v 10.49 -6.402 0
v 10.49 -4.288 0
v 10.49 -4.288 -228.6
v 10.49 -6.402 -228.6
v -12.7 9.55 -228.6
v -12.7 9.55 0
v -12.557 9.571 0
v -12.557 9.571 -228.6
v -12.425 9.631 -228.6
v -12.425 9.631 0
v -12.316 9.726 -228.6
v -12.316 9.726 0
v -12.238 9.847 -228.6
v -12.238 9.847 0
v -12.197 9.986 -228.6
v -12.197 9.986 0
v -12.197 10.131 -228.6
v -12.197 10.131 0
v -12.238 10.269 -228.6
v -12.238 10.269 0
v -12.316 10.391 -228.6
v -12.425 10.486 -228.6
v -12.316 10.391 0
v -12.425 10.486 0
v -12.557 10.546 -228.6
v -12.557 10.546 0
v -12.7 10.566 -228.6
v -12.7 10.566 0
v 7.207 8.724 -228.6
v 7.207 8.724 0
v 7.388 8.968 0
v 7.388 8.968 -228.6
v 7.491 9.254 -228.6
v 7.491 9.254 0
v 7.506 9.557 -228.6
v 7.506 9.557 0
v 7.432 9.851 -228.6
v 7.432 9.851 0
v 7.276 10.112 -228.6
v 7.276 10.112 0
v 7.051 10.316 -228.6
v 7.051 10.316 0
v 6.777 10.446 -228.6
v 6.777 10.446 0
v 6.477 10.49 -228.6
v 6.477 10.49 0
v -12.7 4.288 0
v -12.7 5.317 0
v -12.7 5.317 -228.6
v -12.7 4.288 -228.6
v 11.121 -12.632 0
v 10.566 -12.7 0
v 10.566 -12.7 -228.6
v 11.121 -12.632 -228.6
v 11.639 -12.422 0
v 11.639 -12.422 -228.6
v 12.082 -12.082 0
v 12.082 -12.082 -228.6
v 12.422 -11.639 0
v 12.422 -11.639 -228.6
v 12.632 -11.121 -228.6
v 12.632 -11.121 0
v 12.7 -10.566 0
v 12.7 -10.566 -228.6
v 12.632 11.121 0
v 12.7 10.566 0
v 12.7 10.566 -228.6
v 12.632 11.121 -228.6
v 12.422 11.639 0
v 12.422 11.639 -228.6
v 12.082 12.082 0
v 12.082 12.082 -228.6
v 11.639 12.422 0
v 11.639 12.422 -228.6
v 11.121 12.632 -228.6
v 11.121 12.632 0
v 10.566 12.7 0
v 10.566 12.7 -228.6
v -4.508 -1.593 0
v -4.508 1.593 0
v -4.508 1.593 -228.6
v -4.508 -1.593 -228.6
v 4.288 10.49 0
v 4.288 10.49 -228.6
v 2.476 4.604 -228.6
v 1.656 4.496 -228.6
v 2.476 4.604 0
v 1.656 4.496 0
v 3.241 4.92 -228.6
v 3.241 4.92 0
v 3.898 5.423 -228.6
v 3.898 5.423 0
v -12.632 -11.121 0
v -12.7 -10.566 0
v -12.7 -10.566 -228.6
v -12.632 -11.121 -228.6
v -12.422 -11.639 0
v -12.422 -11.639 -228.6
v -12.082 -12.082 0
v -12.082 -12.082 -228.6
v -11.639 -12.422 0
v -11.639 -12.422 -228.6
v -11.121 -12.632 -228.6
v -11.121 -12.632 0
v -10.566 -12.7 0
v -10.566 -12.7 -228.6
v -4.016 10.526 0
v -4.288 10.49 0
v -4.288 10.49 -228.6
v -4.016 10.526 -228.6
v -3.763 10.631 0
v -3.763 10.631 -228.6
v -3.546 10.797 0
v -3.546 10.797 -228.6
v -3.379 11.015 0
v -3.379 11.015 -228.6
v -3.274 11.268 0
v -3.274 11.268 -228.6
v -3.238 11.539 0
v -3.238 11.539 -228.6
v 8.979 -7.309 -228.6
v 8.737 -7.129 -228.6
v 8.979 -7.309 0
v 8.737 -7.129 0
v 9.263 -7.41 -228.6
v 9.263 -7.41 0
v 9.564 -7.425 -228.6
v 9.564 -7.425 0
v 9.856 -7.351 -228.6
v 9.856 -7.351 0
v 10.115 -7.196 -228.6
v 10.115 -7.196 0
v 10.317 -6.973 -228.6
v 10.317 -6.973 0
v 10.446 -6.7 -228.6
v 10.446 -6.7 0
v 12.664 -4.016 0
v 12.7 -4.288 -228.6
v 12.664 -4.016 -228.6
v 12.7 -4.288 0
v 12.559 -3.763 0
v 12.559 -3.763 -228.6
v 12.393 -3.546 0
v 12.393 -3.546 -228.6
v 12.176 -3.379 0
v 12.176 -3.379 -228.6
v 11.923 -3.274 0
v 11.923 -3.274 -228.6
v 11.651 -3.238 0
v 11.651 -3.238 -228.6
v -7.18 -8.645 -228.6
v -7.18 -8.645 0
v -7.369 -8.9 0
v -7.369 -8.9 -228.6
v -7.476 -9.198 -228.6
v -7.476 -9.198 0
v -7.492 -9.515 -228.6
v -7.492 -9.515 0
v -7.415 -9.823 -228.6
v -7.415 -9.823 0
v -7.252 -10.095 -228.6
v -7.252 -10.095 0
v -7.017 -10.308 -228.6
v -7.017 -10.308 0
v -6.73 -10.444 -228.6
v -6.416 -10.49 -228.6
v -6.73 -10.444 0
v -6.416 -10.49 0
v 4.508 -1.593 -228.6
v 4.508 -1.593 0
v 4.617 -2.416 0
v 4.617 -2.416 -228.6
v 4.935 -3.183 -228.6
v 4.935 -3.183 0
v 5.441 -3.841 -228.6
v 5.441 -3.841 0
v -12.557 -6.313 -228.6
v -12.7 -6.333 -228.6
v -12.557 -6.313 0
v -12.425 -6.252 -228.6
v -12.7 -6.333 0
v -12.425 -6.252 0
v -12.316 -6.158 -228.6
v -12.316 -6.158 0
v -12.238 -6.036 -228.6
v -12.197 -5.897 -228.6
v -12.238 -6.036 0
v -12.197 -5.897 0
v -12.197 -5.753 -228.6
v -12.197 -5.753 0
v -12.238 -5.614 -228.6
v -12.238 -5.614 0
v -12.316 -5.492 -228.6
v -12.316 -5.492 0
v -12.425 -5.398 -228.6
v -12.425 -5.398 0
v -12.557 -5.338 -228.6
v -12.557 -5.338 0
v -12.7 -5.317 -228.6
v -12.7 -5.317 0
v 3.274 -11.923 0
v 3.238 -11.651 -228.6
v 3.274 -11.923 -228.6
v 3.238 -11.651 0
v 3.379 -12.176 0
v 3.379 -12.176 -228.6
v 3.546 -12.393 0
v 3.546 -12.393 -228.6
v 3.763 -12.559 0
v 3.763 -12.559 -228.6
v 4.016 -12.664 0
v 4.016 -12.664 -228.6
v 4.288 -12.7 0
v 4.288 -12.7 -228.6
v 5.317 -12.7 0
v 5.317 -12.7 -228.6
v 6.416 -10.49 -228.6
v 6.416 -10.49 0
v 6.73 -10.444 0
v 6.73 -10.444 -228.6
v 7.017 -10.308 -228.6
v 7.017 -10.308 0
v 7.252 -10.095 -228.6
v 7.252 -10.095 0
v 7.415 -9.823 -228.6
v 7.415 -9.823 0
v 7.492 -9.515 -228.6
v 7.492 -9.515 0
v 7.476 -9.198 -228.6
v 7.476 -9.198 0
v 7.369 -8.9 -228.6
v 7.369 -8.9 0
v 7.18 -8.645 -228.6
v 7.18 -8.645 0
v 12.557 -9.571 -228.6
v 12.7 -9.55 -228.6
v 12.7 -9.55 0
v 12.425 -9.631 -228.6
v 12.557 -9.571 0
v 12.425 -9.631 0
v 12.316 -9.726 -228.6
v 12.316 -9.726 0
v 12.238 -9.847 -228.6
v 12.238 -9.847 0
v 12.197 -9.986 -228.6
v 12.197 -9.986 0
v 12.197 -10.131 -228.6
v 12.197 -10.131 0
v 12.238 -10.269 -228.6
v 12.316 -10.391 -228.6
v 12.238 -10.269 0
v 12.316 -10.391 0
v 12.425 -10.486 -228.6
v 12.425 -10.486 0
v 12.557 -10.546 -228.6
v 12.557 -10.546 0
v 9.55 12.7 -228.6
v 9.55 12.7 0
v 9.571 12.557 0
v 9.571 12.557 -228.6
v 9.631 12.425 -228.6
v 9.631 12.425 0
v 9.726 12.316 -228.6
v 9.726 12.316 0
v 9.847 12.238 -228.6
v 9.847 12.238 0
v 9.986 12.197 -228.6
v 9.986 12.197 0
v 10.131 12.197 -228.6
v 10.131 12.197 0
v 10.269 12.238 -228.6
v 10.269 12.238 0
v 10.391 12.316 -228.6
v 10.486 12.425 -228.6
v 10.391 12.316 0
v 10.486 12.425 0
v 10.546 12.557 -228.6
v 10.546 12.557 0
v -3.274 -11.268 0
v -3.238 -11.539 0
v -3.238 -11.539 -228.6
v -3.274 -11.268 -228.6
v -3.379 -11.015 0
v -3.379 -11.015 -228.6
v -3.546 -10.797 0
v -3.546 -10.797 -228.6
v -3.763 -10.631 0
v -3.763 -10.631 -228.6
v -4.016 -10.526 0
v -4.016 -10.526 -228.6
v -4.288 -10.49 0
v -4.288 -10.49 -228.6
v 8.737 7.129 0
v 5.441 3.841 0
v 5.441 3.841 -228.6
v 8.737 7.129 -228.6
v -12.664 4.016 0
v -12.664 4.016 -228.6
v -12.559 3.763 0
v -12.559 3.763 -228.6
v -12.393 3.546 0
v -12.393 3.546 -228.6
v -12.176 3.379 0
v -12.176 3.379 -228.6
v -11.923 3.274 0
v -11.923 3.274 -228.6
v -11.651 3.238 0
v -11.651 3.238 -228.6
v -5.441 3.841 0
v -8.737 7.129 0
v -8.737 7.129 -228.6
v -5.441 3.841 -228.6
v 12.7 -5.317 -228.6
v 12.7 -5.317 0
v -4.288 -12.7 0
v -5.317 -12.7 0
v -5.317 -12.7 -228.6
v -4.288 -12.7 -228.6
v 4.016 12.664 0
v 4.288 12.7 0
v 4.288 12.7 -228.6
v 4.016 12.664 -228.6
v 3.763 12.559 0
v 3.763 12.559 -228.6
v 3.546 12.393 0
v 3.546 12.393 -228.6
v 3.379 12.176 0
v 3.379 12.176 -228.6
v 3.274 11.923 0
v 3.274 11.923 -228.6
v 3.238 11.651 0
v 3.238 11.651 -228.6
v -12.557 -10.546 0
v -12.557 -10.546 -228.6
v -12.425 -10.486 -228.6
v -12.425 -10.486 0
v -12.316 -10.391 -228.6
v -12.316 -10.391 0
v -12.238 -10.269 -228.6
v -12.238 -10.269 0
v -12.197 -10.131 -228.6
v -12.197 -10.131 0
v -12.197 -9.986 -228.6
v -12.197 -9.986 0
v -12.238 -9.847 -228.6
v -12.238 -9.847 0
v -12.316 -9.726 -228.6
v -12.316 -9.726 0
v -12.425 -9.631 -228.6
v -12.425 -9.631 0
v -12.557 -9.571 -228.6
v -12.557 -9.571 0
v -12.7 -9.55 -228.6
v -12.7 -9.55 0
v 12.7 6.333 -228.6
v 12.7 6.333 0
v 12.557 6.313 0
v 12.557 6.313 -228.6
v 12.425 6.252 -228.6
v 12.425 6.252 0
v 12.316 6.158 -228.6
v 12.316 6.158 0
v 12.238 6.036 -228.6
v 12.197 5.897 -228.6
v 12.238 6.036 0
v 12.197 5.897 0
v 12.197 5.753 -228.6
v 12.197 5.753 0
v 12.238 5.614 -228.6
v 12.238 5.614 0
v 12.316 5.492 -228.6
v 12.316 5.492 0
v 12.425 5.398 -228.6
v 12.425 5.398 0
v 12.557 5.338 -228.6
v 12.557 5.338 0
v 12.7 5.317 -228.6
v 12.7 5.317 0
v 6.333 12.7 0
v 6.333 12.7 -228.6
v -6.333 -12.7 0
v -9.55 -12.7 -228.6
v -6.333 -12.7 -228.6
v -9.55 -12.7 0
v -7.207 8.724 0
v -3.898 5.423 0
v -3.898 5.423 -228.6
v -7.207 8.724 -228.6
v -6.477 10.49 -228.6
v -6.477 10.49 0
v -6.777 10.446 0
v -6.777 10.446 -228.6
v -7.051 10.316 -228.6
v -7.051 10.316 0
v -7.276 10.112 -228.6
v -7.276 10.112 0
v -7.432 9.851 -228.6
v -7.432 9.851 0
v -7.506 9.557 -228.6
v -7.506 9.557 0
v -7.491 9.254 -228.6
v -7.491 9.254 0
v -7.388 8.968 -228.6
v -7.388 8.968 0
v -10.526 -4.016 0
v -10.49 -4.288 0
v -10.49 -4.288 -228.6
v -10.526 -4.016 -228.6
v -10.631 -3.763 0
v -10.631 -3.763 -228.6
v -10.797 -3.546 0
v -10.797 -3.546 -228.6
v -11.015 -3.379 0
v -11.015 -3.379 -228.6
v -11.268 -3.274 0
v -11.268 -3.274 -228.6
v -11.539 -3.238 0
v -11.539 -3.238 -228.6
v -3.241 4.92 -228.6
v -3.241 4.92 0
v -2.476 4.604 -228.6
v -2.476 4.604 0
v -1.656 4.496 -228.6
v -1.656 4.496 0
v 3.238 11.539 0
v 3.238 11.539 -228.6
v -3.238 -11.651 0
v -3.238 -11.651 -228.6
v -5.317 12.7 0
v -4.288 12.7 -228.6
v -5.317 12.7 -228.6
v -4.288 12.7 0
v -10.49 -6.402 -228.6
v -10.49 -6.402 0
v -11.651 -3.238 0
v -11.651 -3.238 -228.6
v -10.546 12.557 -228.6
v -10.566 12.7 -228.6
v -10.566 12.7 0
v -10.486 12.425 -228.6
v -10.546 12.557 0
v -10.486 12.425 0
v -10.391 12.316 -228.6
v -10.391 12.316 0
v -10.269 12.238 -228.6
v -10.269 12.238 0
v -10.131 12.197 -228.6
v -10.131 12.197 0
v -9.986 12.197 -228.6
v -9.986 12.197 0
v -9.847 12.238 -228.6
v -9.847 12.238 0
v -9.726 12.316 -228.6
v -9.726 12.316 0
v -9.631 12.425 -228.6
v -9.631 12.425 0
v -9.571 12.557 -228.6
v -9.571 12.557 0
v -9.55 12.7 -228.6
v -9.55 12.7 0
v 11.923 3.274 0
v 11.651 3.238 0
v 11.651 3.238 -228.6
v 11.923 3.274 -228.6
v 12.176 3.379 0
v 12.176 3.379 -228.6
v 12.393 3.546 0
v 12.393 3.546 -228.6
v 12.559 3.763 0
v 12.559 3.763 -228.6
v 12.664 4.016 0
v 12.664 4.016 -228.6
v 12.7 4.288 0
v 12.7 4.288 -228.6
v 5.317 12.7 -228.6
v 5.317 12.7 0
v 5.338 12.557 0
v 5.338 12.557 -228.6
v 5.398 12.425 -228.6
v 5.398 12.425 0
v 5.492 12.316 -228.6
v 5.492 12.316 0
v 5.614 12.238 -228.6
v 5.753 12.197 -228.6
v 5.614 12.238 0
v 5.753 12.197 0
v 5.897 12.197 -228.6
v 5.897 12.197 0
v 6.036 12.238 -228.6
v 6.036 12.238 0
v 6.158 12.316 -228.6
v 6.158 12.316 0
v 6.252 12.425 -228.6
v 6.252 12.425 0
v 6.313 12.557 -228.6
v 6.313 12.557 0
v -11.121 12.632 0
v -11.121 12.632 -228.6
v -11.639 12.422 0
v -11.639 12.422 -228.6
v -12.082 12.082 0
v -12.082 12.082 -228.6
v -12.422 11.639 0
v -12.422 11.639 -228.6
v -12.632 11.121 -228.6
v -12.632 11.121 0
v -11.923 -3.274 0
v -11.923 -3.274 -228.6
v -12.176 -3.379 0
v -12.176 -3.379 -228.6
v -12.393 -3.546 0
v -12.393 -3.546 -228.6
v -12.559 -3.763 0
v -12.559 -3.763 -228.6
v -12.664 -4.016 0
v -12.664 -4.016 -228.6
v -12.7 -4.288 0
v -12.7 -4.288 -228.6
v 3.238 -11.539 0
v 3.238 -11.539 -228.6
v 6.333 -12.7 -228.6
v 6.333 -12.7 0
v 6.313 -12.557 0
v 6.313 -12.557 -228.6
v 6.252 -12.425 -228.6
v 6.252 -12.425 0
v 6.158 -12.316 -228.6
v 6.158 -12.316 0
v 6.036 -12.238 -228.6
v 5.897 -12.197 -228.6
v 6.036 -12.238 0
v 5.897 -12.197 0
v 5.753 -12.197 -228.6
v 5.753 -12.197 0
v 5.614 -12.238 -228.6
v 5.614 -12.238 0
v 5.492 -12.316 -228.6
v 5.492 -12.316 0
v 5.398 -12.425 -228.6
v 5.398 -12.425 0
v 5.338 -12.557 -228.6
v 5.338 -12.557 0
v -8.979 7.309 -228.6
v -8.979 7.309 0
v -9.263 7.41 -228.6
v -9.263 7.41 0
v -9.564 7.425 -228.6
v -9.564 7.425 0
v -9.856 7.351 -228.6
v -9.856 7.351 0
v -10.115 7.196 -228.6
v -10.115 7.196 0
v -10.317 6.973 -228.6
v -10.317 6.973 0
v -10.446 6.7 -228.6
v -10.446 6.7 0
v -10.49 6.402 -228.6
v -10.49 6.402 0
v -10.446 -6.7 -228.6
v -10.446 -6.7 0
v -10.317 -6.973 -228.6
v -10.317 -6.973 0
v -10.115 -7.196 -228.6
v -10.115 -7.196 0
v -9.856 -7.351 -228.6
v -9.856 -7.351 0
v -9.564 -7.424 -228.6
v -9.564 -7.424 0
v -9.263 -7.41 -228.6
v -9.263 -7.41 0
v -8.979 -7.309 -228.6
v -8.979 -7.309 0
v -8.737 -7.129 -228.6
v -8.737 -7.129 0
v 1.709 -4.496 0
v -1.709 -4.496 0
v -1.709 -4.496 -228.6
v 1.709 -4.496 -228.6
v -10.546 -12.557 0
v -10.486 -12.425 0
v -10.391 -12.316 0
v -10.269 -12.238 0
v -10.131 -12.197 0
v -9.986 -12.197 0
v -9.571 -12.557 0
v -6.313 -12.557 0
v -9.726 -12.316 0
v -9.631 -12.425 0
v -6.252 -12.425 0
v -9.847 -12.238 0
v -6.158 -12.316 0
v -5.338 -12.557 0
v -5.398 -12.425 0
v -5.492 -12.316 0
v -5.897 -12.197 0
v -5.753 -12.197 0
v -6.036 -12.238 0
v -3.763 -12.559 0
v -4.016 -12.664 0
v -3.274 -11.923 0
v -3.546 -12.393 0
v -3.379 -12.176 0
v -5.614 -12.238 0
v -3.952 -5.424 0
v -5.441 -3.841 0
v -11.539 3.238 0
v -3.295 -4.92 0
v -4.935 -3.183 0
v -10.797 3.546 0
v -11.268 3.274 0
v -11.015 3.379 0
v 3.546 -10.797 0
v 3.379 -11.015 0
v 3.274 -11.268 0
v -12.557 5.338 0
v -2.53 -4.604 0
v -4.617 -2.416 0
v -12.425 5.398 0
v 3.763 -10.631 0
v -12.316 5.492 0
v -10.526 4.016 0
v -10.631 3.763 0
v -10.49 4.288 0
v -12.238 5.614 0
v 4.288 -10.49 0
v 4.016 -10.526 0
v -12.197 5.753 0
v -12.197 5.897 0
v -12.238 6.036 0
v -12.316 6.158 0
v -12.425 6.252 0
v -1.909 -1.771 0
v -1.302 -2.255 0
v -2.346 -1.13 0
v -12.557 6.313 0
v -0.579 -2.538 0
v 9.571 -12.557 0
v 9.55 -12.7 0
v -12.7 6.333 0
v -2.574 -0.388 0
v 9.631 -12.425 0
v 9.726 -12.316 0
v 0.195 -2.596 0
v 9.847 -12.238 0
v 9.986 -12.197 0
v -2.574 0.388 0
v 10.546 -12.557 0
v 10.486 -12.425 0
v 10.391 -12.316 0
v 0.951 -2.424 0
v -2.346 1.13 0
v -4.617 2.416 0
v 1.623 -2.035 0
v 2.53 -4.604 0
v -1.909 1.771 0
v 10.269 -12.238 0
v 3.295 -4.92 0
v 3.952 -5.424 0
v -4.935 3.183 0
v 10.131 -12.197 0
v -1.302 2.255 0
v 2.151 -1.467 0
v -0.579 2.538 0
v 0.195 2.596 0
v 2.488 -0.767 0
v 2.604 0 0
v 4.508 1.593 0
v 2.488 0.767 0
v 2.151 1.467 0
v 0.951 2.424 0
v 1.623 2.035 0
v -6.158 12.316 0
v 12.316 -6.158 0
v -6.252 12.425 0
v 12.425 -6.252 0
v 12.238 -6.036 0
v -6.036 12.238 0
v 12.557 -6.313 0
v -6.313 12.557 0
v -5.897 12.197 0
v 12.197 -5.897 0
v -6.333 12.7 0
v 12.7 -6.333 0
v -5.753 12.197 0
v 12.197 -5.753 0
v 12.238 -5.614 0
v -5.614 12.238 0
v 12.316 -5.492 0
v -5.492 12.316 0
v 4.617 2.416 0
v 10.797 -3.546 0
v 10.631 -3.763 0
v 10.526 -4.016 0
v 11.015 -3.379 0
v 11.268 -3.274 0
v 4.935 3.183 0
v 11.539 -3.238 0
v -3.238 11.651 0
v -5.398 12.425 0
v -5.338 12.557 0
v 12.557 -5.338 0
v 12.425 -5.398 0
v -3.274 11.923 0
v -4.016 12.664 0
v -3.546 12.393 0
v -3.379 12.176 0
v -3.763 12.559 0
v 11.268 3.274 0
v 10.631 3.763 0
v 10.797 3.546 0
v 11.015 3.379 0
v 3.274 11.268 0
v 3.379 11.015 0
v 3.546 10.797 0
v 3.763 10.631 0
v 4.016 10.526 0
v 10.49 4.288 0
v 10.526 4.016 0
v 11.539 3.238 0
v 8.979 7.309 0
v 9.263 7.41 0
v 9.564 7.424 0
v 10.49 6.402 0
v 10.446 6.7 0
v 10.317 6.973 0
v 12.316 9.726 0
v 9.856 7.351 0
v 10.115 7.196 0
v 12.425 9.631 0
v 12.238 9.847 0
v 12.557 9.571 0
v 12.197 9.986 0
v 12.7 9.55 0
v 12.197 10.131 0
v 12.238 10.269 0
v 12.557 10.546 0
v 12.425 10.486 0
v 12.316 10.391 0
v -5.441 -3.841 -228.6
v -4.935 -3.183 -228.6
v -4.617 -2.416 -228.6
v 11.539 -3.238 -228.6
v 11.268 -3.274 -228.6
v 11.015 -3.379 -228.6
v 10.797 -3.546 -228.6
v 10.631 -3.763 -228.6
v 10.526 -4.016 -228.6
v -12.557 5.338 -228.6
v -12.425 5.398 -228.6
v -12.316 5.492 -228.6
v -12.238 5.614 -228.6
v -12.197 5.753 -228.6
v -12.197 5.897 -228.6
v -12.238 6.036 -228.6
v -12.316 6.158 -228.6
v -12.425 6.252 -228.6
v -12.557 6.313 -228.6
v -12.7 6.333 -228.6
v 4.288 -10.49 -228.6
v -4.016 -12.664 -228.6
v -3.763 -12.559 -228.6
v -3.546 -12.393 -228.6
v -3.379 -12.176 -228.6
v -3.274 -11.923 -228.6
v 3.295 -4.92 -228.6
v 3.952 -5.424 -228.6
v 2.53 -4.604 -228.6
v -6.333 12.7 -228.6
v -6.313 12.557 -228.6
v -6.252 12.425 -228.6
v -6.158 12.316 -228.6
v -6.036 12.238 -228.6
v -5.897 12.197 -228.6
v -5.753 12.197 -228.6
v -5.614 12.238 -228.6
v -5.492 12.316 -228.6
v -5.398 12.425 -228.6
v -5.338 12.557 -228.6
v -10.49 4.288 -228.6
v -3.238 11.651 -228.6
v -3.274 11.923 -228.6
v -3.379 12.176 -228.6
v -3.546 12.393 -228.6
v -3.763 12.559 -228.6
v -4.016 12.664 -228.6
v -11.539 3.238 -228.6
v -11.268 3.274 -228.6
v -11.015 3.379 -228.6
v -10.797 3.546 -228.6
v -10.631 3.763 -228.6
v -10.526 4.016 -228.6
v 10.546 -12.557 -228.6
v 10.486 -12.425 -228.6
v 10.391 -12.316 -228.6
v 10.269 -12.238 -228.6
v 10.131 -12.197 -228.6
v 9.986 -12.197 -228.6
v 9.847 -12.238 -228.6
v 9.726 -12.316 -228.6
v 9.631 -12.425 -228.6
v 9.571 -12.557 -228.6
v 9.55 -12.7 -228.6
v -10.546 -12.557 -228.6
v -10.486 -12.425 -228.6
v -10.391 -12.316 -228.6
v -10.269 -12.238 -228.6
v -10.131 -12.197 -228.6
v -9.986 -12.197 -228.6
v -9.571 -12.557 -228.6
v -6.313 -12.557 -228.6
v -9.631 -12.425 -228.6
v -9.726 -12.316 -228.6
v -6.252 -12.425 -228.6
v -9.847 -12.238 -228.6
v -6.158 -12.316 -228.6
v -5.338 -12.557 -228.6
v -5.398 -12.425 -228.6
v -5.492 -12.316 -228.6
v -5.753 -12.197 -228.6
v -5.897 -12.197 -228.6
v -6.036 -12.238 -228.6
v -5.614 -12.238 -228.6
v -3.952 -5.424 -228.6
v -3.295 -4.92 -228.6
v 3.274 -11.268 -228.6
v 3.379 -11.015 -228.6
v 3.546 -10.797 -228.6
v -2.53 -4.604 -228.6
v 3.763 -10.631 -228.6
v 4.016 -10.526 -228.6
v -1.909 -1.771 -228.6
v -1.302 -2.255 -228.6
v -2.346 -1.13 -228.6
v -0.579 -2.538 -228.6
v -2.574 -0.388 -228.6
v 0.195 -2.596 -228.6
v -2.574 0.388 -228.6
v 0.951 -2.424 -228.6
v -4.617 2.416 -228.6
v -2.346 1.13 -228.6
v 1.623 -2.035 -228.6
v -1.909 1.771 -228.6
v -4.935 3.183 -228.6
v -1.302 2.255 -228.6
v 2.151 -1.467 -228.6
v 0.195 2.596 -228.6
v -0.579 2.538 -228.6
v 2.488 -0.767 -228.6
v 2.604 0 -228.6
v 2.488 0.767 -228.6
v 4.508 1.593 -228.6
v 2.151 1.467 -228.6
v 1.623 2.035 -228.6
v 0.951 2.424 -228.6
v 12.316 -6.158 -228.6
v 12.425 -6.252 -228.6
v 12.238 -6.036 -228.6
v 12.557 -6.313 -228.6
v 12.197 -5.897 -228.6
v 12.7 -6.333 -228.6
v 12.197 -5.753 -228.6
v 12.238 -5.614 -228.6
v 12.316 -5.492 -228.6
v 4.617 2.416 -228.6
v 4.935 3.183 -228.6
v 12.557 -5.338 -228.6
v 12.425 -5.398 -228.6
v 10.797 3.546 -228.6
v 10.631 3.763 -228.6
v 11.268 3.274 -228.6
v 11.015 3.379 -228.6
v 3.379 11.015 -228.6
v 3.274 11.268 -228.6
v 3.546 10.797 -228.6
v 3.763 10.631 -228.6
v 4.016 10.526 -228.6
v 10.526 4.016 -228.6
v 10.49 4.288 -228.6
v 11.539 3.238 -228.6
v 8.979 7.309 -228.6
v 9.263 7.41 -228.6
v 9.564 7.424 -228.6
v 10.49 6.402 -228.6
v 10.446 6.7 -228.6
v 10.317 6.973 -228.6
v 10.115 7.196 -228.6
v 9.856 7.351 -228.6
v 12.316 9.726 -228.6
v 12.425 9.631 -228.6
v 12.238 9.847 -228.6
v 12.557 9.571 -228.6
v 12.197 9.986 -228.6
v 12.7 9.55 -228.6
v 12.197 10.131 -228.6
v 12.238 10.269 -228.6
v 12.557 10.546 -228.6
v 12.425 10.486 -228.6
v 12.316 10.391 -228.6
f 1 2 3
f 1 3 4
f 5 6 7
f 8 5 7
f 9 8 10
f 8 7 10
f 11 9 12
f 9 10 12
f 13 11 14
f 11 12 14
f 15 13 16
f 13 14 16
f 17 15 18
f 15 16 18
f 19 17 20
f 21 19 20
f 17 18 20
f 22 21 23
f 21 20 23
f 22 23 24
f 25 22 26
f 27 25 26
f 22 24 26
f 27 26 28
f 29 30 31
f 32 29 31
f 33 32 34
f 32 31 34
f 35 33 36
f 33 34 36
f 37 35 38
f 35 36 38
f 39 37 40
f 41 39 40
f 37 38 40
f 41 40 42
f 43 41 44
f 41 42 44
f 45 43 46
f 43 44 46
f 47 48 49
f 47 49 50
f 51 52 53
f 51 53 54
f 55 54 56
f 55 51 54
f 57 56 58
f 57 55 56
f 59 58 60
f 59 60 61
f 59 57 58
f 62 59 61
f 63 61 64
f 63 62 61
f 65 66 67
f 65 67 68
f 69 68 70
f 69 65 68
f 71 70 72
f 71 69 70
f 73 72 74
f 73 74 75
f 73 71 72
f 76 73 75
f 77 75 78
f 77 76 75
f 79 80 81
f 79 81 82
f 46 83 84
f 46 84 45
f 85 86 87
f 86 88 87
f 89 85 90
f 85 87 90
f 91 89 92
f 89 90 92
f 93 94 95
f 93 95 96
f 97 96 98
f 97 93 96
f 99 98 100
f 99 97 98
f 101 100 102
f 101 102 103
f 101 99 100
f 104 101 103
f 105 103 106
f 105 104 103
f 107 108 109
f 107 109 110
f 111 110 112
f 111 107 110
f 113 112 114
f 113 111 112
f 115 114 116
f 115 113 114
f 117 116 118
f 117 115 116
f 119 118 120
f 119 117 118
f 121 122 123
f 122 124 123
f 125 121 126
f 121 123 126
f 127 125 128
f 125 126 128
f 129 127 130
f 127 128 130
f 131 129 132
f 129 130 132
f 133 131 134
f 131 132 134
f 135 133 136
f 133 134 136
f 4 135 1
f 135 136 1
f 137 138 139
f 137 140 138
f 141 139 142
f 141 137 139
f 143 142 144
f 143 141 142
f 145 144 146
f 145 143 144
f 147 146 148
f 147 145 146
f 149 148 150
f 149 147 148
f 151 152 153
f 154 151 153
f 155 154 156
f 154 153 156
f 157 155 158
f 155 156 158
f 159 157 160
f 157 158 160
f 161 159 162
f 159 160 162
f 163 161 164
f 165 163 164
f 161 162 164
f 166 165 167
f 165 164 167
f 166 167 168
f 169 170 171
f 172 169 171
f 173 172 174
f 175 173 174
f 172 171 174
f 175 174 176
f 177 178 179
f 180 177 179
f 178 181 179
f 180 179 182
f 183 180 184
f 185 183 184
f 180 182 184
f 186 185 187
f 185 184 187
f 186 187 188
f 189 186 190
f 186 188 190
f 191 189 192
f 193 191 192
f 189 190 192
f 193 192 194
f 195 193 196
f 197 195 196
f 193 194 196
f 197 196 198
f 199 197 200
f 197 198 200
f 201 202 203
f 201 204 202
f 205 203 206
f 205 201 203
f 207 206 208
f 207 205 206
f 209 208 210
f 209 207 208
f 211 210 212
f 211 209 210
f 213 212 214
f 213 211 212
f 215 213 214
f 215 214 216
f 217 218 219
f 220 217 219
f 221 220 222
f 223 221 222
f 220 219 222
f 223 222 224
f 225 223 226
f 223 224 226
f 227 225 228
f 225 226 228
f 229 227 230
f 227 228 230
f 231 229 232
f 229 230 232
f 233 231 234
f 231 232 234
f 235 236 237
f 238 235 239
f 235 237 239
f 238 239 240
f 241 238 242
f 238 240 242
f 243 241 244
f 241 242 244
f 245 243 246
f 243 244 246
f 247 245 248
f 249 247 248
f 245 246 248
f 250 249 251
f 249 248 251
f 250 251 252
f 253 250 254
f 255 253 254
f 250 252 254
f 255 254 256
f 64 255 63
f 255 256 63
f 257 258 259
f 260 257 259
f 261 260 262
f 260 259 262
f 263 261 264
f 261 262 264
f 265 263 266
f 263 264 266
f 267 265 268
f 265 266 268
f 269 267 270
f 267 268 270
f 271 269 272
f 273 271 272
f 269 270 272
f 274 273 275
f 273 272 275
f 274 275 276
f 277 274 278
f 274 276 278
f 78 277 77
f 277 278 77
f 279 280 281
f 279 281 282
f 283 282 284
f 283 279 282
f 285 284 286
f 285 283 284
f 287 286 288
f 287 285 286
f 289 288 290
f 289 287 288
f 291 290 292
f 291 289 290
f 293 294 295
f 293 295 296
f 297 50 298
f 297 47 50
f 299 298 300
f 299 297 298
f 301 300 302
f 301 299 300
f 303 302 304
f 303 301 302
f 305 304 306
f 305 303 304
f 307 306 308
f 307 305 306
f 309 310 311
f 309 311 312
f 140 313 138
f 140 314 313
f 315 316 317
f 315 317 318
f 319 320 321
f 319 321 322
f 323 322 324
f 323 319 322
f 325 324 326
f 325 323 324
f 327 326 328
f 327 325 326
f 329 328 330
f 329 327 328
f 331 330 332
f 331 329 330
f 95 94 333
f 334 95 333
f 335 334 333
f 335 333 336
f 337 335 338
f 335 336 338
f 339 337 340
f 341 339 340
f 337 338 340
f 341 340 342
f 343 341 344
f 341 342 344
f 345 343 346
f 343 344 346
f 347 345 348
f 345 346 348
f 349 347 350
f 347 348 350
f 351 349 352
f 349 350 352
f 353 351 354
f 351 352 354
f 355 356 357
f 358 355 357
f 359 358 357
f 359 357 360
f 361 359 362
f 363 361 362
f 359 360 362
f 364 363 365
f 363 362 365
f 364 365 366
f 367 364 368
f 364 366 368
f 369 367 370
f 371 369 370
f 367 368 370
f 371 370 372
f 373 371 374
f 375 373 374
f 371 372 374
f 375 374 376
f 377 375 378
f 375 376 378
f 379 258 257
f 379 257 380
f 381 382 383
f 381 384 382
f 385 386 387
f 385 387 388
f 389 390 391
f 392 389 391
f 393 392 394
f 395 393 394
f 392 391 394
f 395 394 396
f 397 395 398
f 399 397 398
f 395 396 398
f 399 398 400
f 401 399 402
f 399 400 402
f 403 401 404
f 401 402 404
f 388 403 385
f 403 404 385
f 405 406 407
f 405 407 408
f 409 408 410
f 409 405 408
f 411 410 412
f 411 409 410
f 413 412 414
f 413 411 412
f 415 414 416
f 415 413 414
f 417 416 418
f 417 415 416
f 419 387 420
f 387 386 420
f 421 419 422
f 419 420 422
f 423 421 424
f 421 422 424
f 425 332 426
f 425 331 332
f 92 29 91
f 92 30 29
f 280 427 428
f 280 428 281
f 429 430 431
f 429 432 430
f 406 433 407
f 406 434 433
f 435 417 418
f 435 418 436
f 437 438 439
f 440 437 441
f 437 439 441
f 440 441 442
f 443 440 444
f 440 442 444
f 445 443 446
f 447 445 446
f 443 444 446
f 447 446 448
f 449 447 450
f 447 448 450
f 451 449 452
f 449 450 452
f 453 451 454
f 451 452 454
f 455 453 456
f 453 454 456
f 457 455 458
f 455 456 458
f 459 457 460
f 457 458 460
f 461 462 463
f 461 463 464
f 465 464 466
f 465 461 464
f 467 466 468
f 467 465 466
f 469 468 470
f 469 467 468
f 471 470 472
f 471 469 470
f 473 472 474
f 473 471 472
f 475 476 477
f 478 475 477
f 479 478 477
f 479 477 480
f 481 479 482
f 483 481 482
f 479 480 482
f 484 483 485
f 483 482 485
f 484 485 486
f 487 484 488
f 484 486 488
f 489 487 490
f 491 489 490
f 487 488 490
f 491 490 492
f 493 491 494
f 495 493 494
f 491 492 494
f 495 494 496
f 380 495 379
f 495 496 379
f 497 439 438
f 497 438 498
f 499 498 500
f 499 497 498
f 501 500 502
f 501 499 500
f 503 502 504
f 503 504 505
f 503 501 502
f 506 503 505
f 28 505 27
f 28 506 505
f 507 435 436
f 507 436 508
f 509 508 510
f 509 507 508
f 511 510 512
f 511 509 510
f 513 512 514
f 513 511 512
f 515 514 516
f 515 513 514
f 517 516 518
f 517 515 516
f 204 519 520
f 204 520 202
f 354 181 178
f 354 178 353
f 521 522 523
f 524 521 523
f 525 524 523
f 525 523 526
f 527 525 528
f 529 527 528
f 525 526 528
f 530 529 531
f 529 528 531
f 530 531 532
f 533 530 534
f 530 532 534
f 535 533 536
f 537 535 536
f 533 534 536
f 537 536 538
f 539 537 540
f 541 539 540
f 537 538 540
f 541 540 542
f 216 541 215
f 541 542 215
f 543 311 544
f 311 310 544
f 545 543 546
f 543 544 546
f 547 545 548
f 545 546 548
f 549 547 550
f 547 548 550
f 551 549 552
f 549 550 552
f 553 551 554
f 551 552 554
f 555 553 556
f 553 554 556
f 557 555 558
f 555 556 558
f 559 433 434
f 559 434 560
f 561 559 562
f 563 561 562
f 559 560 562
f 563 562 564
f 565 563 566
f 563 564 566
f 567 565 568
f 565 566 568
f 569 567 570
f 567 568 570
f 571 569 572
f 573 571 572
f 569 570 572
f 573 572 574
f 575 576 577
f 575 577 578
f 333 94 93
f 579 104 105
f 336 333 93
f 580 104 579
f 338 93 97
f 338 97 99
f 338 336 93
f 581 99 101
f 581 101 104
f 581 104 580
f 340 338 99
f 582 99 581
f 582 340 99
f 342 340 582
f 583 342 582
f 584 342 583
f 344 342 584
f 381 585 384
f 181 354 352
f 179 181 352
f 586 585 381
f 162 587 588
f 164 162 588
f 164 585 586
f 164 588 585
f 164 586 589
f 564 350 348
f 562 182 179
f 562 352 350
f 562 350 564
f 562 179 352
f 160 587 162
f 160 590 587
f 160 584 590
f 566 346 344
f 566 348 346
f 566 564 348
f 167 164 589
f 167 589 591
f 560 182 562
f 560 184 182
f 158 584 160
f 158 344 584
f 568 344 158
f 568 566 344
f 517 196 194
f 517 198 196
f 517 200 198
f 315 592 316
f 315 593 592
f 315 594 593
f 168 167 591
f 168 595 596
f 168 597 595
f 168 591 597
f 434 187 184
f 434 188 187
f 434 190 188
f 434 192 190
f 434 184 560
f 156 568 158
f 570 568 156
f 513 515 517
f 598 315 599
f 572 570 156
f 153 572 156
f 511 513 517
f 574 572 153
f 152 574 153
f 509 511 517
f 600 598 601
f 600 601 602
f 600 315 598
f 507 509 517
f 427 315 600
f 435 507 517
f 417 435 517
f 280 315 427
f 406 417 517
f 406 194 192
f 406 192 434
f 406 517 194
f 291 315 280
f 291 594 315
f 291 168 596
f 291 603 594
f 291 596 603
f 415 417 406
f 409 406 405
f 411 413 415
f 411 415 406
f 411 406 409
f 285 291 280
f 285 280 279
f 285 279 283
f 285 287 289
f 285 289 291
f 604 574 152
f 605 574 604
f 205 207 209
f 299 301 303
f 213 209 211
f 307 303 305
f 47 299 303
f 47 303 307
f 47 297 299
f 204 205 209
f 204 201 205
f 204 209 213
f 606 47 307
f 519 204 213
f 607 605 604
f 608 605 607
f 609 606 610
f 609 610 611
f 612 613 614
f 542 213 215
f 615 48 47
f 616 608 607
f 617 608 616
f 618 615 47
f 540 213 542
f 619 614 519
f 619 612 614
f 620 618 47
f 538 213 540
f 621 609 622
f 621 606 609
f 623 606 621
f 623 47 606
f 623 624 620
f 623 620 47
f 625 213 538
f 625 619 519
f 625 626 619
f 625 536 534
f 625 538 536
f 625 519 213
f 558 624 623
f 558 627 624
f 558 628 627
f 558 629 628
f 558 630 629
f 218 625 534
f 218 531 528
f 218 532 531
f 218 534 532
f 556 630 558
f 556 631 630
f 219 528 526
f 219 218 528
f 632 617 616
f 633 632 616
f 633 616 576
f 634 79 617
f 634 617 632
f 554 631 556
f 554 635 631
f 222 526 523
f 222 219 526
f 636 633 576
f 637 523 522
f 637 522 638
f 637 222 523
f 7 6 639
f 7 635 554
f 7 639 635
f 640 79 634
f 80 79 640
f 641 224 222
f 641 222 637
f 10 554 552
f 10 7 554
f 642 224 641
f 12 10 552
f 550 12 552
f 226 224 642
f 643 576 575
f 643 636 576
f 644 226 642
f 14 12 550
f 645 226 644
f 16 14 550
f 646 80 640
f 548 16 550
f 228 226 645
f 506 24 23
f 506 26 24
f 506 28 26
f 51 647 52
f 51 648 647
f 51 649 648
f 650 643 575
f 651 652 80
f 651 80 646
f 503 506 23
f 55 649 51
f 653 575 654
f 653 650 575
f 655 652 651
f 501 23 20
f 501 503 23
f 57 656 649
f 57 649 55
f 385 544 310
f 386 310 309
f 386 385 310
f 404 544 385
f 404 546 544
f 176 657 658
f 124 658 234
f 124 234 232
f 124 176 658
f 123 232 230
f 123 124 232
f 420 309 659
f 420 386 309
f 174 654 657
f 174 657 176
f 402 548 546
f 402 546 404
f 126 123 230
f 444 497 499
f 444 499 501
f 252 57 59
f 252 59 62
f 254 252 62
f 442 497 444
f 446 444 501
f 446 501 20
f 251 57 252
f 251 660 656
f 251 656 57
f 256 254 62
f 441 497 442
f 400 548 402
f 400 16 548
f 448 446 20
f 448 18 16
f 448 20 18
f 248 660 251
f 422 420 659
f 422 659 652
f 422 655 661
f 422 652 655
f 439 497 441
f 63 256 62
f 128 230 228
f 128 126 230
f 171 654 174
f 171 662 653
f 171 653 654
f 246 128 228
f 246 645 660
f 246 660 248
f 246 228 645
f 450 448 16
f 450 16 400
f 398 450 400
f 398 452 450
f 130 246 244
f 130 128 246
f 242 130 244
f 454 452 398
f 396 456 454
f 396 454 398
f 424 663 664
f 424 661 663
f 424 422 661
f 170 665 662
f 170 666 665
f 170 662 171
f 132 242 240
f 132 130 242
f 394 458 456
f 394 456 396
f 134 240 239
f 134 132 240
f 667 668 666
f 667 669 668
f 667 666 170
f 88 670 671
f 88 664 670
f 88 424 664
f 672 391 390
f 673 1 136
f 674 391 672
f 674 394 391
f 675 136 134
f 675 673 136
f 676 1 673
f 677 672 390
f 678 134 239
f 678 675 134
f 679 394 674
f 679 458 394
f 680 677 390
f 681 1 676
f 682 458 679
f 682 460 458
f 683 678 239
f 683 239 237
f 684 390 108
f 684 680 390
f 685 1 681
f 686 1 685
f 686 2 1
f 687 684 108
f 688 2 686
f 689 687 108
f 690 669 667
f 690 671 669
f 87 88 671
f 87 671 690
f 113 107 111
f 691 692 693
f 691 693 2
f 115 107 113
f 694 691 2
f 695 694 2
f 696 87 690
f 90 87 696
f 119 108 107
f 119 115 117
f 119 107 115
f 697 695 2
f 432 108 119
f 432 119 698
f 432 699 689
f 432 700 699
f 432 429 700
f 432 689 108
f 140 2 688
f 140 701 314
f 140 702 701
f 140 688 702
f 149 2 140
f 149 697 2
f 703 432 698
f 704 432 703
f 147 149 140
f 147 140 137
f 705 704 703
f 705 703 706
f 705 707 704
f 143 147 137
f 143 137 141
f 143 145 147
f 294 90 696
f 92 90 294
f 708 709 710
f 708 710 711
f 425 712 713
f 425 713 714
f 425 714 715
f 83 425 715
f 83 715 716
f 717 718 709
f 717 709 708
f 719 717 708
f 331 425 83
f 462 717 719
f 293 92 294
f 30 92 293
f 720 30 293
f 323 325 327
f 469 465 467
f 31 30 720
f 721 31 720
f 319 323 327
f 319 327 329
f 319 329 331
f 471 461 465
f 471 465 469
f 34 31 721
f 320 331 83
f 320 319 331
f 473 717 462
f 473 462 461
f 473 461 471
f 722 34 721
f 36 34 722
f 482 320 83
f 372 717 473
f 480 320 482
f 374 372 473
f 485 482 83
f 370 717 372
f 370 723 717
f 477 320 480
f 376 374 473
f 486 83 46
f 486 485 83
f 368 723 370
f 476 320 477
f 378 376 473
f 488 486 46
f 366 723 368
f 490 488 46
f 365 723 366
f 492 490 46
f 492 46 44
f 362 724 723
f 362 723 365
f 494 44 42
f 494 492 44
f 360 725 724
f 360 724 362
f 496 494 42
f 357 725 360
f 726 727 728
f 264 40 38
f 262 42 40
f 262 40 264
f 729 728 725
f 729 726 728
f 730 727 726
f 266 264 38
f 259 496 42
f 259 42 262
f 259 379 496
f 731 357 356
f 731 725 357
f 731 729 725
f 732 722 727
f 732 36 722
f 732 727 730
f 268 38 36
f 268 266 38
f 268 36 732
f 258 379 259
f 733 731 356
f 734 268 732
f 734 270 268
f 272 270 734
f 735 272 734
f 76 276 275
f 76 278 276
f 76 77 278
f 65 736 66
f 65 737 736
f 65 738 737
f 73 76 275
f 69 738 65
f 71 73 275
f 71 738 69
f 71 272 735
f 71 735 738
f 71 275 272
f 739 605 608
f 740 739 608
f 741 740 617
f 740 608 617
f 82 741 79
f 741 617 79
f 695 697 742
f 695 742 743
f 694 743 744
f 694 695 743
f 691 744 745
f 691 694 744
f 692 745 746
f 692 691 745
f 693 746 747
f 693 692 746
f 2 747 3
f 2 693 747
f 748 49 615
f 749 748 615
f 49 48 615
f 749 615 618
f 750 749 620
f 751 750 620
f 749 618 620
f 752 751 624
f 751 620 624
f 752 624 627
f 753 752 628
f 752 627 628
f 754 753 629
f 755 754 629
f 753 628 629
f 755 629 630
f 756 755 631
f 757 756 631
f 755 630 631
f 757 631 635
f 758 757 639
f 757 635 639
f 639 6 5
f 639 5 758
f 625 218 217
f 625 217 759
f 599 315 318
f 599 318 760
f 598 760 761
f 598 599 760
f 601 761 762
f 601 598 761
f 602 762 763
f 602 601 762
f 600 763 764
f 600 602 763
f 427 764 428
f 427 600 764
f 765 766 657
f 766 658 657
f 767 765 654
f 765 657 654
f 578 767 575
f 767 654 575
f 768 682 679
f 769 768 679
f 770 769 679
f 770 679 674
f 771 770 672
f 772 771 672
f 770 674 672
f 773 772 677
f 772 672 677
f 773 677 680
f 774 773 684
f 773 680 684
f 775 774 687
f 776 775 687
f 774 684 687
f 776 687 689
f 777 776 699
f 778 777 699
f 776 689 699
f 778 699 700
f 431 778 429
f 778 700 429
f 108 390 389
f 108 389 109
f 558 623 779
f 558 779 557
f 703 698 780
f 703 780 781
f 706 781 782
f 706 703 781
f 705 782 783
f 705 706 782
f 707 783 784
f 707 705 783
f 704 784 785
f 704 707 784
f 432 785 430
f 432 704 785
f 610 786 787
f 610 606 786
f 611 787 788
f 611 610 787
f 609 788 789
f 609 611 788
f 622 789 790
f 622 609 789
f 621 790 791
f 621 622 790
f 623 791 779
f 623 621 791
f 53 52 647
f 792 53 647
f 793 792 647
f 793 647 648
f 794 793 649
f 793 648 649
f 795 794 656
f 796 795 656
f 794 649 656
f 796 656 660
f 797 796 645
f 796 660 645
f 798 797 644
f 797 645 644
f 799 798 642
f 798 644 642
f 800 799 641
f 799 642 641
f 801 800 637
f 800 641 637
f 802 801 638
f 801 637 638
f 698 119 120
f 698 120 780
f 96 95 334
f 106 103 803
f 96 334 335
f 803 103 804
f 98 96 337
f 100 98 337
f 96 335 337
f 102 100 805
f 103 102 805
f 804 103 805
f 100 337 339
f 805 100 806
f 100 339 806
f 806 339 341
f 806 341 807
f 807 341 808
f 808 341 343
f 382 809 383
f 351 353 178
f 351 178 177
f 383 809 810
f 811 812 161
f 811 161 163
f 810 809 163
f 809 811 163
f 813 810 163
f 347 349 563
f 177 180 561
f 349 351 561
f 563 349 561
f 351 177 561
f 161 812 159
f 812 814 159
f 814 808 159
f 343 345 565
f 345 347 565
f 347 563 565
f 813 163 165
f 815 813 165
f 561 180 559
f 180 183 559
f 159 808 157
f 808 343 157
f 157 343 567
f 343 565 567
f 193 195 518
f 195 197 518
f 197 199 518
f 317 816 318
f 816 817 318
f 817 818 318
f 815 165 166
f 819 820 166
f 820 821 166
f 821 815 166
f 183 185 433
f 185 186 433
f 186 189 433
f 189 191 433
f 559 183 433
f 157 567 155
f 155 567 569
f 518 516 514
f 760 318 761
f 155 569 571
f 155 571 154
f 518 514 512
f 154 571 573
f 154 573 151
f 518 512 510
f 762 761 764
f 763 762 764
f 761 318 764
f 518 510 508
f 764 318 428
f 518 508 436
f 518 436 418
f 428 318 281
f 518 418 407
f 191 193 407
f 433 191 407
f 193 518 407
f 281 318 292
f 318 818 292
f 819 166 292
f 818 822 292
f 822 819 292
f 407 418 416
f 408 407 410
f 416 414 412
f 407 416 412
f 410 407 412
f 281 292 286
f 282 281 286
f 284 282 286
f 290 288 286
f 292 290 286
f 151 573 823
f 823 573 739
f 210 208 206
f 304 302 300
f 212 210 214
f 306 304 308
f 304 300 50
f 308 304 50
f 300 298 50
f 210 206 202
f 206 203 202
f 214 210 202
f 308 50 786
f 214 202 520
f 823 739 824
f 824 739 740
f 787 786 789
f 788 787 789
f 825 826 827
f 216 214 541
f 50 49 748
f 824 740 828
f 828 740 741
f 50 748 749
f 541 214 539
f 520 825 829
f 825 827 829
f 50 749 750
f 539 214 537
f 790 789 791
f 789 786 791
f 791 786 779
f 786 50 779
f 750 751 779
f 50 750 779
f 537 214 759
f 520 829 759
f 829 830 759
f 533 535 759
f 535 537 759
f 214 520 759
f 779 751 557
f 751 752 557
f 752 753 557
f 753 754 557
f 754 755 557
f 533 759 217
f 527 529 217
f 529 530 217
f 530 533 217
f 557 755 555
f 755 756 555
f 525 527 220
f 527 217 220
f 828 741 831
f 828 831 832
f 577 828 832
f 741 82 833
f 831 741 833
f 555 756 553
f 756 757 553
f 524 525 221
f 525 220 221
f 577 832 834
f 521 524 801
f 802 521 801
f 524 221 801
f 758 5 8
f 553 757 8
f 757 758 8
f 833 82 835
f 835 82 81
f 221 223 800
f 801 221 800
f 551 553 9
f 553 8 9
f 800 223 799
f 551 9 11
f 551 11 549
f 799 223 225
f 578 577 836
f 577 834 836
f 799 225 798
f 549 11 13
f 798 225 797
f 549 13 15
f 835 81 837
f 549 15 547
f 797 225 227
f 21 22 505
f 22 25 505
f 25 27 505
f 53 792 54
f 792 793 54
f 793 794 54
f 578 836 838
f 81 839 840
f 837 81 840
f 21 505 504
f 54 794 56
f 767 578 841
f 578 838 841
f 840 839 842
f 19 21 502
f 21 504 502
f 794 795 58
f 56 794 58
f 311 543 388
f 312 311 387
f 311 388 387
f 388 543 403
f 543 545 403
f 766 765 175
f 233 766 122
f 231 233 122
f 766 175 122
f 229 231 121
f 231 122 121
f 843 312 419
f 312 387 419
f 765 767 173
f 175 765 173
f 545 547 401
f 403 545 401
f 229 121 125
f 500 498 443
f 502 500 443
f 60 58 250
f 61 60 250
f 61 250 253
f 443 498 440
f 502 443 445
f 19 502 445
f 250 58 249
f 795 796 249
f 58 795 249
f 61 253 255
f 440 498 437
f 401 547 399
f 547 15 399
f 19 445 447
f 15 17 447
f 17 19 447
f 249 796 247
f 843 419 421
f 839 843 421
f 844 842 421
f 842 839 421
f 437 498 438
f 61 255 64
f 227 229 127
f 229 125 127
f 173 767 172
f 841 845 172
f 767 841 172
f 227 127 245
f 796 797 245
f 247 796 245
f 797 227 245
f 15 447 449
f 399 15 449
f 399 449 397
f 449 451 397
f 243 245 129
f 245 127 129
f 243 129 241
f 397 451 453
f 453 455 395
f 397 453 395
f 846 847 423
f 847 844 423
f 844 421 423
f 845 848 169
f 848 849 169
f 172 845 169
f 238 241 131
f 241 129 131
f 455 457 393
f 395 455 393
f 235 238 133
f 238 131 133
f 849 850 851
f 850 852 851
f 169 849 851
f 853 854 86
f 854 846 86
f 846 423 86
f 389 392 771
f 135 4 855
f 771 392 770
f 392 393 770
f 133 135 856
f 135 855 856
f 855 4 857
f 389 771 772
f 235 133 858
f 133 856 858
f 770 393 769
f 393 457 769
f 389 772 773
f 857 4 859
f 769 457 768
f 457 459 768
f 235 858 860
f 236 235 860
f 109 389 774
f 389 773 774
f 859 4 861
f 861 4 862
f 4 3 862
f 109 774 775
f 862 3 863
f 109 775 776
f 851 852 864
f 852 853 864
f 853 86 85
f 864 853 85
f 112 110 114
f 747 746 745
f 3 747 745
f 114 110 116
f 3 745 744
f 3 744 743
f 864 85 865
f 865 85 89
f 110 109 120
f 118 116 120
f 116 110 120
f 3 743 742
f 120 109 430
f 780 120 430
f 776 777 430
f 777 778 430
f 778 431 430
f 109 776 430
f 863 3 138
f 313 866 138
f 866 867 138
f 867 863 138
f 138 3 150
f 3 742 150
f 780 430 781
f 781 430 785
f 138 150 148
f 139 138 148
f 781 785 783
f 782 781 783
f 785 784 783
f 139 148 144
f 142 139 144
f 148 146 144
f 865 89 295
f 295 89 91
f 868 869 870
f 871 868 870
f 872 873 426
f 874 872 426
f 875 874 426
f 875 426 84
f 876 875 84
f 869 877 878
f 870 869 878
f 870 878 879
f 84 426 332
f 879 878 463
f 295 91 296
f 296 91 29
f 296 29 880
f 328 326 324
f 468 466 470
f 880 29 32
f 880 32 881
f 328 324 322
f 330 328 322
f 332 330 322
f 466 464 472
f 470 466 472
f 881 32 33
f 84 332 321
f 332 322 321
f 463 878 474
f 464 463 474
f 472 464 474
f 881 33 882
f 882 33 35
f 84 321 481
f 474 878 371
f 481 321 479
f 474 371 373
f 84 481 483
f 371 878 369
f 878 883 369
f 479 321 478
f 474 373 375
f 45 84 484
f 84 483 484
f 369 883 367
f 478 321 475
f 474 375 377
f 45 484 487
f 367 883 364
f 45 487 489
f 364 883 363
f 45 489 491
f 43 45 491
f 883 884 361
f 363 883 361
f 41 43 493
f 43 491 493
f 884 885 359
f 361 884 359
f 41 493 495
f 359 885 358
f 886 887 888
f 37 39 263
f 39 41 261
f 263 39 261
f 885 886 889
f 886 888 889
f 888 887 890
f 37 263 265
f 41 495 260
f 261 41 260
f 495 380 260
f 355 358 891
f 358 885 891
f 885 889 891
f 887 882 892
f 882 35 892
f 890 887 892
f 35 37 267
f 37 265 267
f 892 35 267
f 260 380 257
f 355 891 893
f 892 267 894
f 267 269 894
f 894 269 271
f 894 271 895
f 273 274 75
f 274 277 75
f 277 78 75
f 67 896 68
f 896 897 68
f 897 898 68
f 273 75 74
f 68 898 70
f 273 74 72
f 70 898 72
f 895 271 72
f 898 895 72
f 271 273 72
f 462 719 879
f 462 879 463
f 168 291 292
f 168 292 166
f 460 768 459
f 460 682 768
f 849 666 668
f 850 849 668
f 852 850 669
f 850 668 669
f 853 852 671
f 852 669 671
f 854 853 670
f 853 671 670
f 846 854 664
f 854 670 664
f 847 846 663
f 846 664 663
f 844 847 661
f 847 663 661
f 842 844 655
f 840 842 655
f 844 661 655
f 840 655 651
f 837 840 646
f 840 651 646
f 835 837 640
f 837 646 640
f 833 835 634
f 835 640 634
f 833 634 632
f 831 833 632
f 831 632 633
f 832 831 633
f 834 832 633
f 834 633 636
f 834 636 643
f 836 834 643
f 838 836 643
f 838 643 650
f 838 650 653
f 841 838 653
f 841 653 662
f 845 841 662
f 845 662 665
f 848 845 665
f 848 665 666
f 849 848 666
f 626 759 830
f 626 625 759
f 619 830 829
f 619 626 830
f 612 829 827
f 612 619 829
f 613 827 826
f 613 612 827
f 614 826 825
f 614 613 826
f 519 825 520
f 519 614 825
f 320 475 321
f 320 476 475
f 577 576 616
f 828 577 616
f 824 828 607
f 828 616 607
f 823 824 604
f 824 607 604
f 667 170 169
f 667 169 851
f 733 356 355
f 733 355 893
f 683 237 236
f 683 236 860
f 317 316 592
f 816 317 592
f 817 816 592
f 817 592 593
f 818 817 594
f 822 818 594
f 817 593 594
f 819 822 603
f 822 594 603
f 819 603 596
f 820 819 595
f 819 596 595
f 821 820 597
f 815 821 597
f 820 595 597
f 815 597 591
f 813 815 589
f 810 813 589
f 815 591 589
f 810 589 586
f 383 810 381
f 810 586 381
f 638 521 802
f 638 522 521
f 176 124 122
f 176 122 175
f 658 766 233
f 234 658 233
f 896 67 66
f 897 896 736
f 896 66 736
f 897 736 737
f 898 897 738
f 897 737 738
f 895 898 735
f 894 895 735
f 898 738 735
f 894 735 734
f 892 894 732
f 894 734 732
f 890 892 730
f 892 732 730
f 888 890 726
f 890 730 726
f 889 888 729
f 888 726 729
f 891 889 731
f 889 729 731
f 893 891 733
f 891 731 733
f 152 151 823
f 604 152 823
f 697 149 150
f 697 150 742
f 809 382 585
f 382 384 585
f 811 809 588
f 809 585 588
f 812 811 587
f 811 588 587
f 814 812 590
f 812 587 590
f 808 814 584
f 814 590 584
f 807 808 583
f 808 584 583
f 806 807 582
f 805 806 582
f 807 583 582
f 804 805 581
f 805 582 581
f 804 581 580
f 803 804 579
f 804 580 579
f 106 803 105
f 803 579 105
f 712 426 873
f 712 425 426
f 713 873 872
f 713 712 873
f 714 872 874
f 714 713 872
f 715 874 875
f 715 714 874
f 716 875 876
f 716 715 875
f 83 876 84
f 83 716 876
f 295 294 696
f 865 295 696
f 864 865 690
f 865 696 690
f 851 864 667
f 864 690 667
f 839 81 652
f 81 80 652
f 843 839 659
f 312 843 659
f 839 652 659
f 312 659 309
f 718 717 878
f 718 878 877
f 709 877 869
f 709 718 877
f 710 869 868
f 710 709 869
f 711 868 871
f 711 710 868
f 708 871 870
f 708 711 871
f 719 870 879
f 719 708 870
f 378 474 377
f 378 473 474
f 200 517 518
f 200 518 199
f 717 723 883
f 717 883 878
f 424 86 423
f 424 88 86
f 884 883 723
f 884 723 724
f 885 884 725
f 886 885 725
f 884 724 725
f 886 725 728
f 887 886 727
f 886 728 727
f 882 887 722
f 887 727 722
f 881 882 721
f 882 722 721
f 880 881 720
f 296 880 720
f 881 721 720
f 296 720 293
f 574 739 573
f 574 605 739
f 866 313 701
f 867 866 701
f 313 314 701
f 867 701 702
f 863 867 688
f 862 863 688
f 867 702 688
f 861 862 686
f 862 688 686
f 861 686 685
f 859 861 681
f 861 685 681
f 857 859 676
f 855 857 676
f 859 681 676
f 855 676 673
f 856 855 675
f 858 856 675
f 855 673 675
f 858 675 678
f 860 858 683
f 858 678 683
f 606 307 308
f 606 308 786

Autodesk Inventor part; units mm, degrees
ref_plane "YZ Plane" through (0, 0, 0) normal (1, 0, 0) x (0, 1, 0)
ref_plane "XZ Plane" through (0, 0, 0) normal (0, 1, 0) x (-1, 0, 0)
ref_plane "XY Plane" through (0, 0, 0) normal (0, 0, 1) x (1, 0, 0)
sketch "Sketch1" plane through (0, 0, 0) normal (0, 0, 1) x (1, 0, 0)
  circle A0 centre (0, 0) radius 2.6035
  arc A1 (-1.7093, -4.4958) -> (-3.9523, -5.4237) centre (-1.7093, -7.6708) ccw
  line L0 (-1.7093, -4.4958) -> (1.7093, -4.4958)
  arc A2 (3.9523, -5.4237) -> (1.7093, -4.4958) centre (1.7093, -7.6708) ccw
  line L1 (3.9523, -5.4237) -> (7.1797, -8.6452)
  arc A3 (6.4164, -10.4902) -> (7.1797, -8.6452) centre (6.4164, -9.4098) ccw
  line L2 (6.4164, -10.4902) -> (4.2875, -10.4902)
  arc A4 (4.2875, -10.4902) -> (3.2385, -11.5392) centre (4.2875, -11.5392) ccw
  line L3 (3.2385, -11.5392) -> (3.2385, -11.651)
  arc A5 (3.2385, -11.651) -> (4.2875, -12.7) centre (4.2875, -11.651) ccw
  line L4 (4.2875, -12.7) -> (5.3171, -12.7)
  arc A6 (6.3331, -12.7) -> (5.3171, -12.7) centre (5.8251, -12.7) ccw
  line L5 (6.3331, -12.7) -> (9.5504, -12.7)
  arc A7 (10.5664, -12.6998) -> (9.5504, -12.7) centre (10.0584, -12.7) ccw
  arc A8 (10.5664, -12.6998) -> (12.6998, -10.5664) centre (10.5918, -10.5918) ccw
  arc A9 (12.7, -9.5504) -> (12.6998, -10.5664) centre (12.7, -10.0584) ccw
  line L6 (12.7, -9.5504) -> (12.7, -6.3331)
  arc A10 (12.7, -5.3171) -> (12.7, -6.3331) centre (12.7, -5.8251) ccw
  line L7 (12.7, -5.3171) -> (12.7, -4.2875)
  arc A11 (12.7, -4.2875) -> (11.651, -3.2385) centre (11.651, -4.2875) ccw
  line L8 (11.651, -3.2385) -> (11.5392, -3.2385)
  arc A12 (11.5392, -3.2385) -> (10.4902, -4.2875) centre (11.5392, -4.2875) ccw
  line L9 (10.4902, -4.2875) -> (10.4902, -6.4021)
  arc A13 (8.7371, -7.1294) -> (10.4902, -6.4021) centre (9.4628, -6.4021) ccw
  line L10 (8.7371, -7.1294) -> (5.441, -3.8408)
  arc A14 (4.5085, -1.5932) -> (5.441, -3.8408) centre (7.6835, -1.5932) ccw
  line L11 (4.5085, -1.5932) -> (4.5085, 1.5932)
  arc A15 (5.441, 3.8408) -> (4.5085, 1.5932) centre (7.6835, 1.5932) ccw
  line L12 (5.441, 3.8408) -> (8.7371, 7.1294)
  arc A16 (10.4902, 6.4021) -> (8.7371, 7.1294) centre (9.4628, 6.4021) ccw
  line L13 (10.4902, 6.4021) -> (10.4902, 4.2875)
  arc A17 (10.4902, 4.2875) -> (11.5392, 3.2385) centre (11.5392, 4.2875) ccw
  line L14 (11.5392, 3.2385) -> (11.651, 3.2385)
  arc A18 (11.651, 3.2385) -> (12.7, 4.2875) centre (11.651, 4.2875) ccw
  line L15 (12.7, 4.2875) -> (12.7, 5.3171)
  arc A19 (12.7, 6.3331) -> (12.7, 5.3171) centre (12.7, 5.8251) ccw
  line L16 (12.7, 6.3331) -> (12.7, 9.5504)
  arc A20 (12.6998, 10.5664) -> (12.7, 9.5504) centre (12.7, 10.0584) ccw
  arc A21 (12.6998, 10.5664) -> (10.5664, 12.6998) centre (10.5918, 10.5918) ccw
  arc A22 (9.5504, 12.7) -> (10.5664, 12.6998) centre (10.0584, 12.7) ccw
  line L17 (9.5504, 12.7) -> (6.3331, 12.7)
  arc A23 (5.3171, 12.7) -> (6.3331, 12.7) centre (5.8251, 12.7) ccw
  line L18 (5.3171, 12.7) -> (4.2875, 12.7)
  arc A24 (4.2875, 12.7) -> (3.2385, 11.651) centre (4.2875, 11.651) ccw
  line L19 (3.2385, 11.651) -> (3.2385, 11.5392)
  arc A25 (3.2385, 11.5392) -> (4.2875, 10.4902) centre (4.2875, 11.5392) ccw
  line L20 (4.2875, 10.4902) -> (6.4768, 10.4902)
  arc A26 (7.207, 8.7244) -> (6.4768, 10.4902) centre (6.4768, 9.4563) ccw
  line L21 (7.207, 8.7244) -> (3.8983, 5.4232)
  arc A27 (1.6558, 4.4958) -> (3.8983, 5.4232) centre (1.6558, 7.6708) ccw
  line L22 (1.6558, 4.4958) -> (-1.6558, 4.4958)
  arc A28 (-3.8983, 5.4232) -> (-1.6558, 4.4958) centre (-1.6558, 7.6708) ccw
  line L23 (-3.8983, 5.4232) -> (-7.207, 8.7244)
  arc A29 (-6.4768, 10.4902) -> (-7.207, 8.7244) centre (-6.4768, 9.4563) ccw
  line L24 (-6.4768, 10.4902) -> (-4.2875, 10.4902)
  arc A30 (-4.2875, 10.4902) -> (-3.2385, 11.5392) centre (-4.2875, 11.5392) ccw
  line L25 (-3.2385, 11.5392) -> (-3.2385, 11.651)
  arc A31 (-3.2385, 11.651) -> (-4.2875, 12.7) centre (-4.2875, 11.651) ccw
  line L26 (-4.2875, 12.7) -> (-5.3171, 12.7)
  arc A32 (-6.3331, 12.7) -> (-5.3171, 12.7) centre (-5.8251, 12.7) ccw
  line L27 (-6.3331, 12.7) -> (-9.5504, 12.7)
  arc A33 (-10.5664, 12.6998) -> (-9.5504, 12.7) centre (-10.0584, 12.7) ccw
  arc A34 (-10.5664, 12.6998) -> (-12.6998, 10.5664) centre (-10.5918, 10.5918) ccw
  arc A35 (-12.7, 9.5504) -> (-12.6998, 10.5664) centre (-12.7, 10.0584) ccw
  line L28 (-12.7, 9.5504) -> (-12.7, 6.3331)
  arc A36 (-12.7, 5.3171) -> (-12.7, 6.3331) centre (-12.7, 5.8251) ccw
  line L29 (-12.7, 5.3171) -> (-12.7, 4.2875)
  arc A37 (-12.7, 4.2875) -> (-11.651, 3.2385) centre (-11.651, 4.2875) ccw
  line L30 (-11.651, 3.2385) -> (-11.5392, 3.2385)
  arc A38 (-11.5392, 3.2385) -> (-10.4902, 4.2875) centre (-11.5392, 4.2875) ccw
  line L31 (-10.4902, 4.2875) -> (-10.4902, 6.4021)
  arc A39 (-8.7371, 7.1294) -> (-10.4902, 6.4021) centre (-9.4628, 6.4021) ccw
  line L32 (-8.7371, 7.1294) -> (-5.441, 3.8408)
  arc A40 (-4.5085, 1.5932) -> (-5.441, 3.8408) centre (-7.6835, 1.5932) ccw
  line L33 (-4.5085, 1.5932) -> (-4.5085, -1.5932)
  arc A41 (-5.441, -3.8408) -> (-4.5085, -1.5932) centre (-7.6835, -1.5932) ccw
  line L34 (-5.441, -3.8408) -> (-8.7371, -7.1294)
  arc A42 (-10.4902, -6.4021) -> (-8.7371, -7.1294) centre (-9.4628, -6.4021) ccw
  line L35 (-10.4902, -6.4021) -> (-10.4902, -4.2875)
  arc A43 (-10.4902, -4.2875) -> (-11.5392, -3.2385) centre (-11.5392, -4.2875) ccw
  line L36 (-11.5392, -3.2385) -> (-11.651, -3.2385)
  arc A44 (-11.651, -3.2385) -> (-12.7, -4.2875) centre (-11.651, -4.2875) ccw
  line L37 (-12.7, -4.2875) -> (-12.7, -5.3171)
  arc A45 (-12.7, -6.3331) -> (-12.7, -5.3171) centre (-12.7, -5.8251) ccw
  line L38 (-12.7, -6.3331) -> (-12.7, -9.5504)
  arc A46 (-12.6998, -10.5664) -> (-12.7, -9.5504) centre (-12.7, -10.0584) ccw
  arc A47 (-12.6998, -10.5664) -> (-10.5664, -12.6998) centre (-10.5918, -10.5918) ccw
  arc A48 (-9.5504, -12.7) -> (-10.5664, -12.6998) centre (-10.0584, -12.7) ccw
  line L39 (-9.5504, -12.7) -> (-6.3331, -12.7)
  arc A49 (-5.3171, -12.7) -> (-6.3331, -12.7) centre (-5.8251, -12.7) ccw
  line L40 (-5.3171, -12.7) -> (-4.2875, -12.7)
  arc A50 (-4.2875, -12.7) -> (-3.2385, -11.651) centre (-4.2875, -11.651) ccw
  line L41 (-3.2385, -11.651) -> (-3.2385, -11.5392)
  arc A51 (-3.2385, -11.5392) -> (-4.2875, -10.4902) centre (-4.2875, -11.5392) ccw
  line L42 (-4.2875, -10.4902) -> (-6.4164, -10.4902)
  arc A52 (-7.1797, -8.6452) -> (-6.4164, -10.4902) centre (-6.4164, -9.4098) ccw
  line L43 (-7.1797, -8.6452) -> (-3.9523, -5.4237)
extrude "Extrusion1" add sketch "Sketch1" against normal blind 228.6
sketch "Sketch2" plane through (0, 0, 0) normal (1, 0, 0) x (0, 1, 0)
  point P0 (0, 0)
properties part number "Hook base"
